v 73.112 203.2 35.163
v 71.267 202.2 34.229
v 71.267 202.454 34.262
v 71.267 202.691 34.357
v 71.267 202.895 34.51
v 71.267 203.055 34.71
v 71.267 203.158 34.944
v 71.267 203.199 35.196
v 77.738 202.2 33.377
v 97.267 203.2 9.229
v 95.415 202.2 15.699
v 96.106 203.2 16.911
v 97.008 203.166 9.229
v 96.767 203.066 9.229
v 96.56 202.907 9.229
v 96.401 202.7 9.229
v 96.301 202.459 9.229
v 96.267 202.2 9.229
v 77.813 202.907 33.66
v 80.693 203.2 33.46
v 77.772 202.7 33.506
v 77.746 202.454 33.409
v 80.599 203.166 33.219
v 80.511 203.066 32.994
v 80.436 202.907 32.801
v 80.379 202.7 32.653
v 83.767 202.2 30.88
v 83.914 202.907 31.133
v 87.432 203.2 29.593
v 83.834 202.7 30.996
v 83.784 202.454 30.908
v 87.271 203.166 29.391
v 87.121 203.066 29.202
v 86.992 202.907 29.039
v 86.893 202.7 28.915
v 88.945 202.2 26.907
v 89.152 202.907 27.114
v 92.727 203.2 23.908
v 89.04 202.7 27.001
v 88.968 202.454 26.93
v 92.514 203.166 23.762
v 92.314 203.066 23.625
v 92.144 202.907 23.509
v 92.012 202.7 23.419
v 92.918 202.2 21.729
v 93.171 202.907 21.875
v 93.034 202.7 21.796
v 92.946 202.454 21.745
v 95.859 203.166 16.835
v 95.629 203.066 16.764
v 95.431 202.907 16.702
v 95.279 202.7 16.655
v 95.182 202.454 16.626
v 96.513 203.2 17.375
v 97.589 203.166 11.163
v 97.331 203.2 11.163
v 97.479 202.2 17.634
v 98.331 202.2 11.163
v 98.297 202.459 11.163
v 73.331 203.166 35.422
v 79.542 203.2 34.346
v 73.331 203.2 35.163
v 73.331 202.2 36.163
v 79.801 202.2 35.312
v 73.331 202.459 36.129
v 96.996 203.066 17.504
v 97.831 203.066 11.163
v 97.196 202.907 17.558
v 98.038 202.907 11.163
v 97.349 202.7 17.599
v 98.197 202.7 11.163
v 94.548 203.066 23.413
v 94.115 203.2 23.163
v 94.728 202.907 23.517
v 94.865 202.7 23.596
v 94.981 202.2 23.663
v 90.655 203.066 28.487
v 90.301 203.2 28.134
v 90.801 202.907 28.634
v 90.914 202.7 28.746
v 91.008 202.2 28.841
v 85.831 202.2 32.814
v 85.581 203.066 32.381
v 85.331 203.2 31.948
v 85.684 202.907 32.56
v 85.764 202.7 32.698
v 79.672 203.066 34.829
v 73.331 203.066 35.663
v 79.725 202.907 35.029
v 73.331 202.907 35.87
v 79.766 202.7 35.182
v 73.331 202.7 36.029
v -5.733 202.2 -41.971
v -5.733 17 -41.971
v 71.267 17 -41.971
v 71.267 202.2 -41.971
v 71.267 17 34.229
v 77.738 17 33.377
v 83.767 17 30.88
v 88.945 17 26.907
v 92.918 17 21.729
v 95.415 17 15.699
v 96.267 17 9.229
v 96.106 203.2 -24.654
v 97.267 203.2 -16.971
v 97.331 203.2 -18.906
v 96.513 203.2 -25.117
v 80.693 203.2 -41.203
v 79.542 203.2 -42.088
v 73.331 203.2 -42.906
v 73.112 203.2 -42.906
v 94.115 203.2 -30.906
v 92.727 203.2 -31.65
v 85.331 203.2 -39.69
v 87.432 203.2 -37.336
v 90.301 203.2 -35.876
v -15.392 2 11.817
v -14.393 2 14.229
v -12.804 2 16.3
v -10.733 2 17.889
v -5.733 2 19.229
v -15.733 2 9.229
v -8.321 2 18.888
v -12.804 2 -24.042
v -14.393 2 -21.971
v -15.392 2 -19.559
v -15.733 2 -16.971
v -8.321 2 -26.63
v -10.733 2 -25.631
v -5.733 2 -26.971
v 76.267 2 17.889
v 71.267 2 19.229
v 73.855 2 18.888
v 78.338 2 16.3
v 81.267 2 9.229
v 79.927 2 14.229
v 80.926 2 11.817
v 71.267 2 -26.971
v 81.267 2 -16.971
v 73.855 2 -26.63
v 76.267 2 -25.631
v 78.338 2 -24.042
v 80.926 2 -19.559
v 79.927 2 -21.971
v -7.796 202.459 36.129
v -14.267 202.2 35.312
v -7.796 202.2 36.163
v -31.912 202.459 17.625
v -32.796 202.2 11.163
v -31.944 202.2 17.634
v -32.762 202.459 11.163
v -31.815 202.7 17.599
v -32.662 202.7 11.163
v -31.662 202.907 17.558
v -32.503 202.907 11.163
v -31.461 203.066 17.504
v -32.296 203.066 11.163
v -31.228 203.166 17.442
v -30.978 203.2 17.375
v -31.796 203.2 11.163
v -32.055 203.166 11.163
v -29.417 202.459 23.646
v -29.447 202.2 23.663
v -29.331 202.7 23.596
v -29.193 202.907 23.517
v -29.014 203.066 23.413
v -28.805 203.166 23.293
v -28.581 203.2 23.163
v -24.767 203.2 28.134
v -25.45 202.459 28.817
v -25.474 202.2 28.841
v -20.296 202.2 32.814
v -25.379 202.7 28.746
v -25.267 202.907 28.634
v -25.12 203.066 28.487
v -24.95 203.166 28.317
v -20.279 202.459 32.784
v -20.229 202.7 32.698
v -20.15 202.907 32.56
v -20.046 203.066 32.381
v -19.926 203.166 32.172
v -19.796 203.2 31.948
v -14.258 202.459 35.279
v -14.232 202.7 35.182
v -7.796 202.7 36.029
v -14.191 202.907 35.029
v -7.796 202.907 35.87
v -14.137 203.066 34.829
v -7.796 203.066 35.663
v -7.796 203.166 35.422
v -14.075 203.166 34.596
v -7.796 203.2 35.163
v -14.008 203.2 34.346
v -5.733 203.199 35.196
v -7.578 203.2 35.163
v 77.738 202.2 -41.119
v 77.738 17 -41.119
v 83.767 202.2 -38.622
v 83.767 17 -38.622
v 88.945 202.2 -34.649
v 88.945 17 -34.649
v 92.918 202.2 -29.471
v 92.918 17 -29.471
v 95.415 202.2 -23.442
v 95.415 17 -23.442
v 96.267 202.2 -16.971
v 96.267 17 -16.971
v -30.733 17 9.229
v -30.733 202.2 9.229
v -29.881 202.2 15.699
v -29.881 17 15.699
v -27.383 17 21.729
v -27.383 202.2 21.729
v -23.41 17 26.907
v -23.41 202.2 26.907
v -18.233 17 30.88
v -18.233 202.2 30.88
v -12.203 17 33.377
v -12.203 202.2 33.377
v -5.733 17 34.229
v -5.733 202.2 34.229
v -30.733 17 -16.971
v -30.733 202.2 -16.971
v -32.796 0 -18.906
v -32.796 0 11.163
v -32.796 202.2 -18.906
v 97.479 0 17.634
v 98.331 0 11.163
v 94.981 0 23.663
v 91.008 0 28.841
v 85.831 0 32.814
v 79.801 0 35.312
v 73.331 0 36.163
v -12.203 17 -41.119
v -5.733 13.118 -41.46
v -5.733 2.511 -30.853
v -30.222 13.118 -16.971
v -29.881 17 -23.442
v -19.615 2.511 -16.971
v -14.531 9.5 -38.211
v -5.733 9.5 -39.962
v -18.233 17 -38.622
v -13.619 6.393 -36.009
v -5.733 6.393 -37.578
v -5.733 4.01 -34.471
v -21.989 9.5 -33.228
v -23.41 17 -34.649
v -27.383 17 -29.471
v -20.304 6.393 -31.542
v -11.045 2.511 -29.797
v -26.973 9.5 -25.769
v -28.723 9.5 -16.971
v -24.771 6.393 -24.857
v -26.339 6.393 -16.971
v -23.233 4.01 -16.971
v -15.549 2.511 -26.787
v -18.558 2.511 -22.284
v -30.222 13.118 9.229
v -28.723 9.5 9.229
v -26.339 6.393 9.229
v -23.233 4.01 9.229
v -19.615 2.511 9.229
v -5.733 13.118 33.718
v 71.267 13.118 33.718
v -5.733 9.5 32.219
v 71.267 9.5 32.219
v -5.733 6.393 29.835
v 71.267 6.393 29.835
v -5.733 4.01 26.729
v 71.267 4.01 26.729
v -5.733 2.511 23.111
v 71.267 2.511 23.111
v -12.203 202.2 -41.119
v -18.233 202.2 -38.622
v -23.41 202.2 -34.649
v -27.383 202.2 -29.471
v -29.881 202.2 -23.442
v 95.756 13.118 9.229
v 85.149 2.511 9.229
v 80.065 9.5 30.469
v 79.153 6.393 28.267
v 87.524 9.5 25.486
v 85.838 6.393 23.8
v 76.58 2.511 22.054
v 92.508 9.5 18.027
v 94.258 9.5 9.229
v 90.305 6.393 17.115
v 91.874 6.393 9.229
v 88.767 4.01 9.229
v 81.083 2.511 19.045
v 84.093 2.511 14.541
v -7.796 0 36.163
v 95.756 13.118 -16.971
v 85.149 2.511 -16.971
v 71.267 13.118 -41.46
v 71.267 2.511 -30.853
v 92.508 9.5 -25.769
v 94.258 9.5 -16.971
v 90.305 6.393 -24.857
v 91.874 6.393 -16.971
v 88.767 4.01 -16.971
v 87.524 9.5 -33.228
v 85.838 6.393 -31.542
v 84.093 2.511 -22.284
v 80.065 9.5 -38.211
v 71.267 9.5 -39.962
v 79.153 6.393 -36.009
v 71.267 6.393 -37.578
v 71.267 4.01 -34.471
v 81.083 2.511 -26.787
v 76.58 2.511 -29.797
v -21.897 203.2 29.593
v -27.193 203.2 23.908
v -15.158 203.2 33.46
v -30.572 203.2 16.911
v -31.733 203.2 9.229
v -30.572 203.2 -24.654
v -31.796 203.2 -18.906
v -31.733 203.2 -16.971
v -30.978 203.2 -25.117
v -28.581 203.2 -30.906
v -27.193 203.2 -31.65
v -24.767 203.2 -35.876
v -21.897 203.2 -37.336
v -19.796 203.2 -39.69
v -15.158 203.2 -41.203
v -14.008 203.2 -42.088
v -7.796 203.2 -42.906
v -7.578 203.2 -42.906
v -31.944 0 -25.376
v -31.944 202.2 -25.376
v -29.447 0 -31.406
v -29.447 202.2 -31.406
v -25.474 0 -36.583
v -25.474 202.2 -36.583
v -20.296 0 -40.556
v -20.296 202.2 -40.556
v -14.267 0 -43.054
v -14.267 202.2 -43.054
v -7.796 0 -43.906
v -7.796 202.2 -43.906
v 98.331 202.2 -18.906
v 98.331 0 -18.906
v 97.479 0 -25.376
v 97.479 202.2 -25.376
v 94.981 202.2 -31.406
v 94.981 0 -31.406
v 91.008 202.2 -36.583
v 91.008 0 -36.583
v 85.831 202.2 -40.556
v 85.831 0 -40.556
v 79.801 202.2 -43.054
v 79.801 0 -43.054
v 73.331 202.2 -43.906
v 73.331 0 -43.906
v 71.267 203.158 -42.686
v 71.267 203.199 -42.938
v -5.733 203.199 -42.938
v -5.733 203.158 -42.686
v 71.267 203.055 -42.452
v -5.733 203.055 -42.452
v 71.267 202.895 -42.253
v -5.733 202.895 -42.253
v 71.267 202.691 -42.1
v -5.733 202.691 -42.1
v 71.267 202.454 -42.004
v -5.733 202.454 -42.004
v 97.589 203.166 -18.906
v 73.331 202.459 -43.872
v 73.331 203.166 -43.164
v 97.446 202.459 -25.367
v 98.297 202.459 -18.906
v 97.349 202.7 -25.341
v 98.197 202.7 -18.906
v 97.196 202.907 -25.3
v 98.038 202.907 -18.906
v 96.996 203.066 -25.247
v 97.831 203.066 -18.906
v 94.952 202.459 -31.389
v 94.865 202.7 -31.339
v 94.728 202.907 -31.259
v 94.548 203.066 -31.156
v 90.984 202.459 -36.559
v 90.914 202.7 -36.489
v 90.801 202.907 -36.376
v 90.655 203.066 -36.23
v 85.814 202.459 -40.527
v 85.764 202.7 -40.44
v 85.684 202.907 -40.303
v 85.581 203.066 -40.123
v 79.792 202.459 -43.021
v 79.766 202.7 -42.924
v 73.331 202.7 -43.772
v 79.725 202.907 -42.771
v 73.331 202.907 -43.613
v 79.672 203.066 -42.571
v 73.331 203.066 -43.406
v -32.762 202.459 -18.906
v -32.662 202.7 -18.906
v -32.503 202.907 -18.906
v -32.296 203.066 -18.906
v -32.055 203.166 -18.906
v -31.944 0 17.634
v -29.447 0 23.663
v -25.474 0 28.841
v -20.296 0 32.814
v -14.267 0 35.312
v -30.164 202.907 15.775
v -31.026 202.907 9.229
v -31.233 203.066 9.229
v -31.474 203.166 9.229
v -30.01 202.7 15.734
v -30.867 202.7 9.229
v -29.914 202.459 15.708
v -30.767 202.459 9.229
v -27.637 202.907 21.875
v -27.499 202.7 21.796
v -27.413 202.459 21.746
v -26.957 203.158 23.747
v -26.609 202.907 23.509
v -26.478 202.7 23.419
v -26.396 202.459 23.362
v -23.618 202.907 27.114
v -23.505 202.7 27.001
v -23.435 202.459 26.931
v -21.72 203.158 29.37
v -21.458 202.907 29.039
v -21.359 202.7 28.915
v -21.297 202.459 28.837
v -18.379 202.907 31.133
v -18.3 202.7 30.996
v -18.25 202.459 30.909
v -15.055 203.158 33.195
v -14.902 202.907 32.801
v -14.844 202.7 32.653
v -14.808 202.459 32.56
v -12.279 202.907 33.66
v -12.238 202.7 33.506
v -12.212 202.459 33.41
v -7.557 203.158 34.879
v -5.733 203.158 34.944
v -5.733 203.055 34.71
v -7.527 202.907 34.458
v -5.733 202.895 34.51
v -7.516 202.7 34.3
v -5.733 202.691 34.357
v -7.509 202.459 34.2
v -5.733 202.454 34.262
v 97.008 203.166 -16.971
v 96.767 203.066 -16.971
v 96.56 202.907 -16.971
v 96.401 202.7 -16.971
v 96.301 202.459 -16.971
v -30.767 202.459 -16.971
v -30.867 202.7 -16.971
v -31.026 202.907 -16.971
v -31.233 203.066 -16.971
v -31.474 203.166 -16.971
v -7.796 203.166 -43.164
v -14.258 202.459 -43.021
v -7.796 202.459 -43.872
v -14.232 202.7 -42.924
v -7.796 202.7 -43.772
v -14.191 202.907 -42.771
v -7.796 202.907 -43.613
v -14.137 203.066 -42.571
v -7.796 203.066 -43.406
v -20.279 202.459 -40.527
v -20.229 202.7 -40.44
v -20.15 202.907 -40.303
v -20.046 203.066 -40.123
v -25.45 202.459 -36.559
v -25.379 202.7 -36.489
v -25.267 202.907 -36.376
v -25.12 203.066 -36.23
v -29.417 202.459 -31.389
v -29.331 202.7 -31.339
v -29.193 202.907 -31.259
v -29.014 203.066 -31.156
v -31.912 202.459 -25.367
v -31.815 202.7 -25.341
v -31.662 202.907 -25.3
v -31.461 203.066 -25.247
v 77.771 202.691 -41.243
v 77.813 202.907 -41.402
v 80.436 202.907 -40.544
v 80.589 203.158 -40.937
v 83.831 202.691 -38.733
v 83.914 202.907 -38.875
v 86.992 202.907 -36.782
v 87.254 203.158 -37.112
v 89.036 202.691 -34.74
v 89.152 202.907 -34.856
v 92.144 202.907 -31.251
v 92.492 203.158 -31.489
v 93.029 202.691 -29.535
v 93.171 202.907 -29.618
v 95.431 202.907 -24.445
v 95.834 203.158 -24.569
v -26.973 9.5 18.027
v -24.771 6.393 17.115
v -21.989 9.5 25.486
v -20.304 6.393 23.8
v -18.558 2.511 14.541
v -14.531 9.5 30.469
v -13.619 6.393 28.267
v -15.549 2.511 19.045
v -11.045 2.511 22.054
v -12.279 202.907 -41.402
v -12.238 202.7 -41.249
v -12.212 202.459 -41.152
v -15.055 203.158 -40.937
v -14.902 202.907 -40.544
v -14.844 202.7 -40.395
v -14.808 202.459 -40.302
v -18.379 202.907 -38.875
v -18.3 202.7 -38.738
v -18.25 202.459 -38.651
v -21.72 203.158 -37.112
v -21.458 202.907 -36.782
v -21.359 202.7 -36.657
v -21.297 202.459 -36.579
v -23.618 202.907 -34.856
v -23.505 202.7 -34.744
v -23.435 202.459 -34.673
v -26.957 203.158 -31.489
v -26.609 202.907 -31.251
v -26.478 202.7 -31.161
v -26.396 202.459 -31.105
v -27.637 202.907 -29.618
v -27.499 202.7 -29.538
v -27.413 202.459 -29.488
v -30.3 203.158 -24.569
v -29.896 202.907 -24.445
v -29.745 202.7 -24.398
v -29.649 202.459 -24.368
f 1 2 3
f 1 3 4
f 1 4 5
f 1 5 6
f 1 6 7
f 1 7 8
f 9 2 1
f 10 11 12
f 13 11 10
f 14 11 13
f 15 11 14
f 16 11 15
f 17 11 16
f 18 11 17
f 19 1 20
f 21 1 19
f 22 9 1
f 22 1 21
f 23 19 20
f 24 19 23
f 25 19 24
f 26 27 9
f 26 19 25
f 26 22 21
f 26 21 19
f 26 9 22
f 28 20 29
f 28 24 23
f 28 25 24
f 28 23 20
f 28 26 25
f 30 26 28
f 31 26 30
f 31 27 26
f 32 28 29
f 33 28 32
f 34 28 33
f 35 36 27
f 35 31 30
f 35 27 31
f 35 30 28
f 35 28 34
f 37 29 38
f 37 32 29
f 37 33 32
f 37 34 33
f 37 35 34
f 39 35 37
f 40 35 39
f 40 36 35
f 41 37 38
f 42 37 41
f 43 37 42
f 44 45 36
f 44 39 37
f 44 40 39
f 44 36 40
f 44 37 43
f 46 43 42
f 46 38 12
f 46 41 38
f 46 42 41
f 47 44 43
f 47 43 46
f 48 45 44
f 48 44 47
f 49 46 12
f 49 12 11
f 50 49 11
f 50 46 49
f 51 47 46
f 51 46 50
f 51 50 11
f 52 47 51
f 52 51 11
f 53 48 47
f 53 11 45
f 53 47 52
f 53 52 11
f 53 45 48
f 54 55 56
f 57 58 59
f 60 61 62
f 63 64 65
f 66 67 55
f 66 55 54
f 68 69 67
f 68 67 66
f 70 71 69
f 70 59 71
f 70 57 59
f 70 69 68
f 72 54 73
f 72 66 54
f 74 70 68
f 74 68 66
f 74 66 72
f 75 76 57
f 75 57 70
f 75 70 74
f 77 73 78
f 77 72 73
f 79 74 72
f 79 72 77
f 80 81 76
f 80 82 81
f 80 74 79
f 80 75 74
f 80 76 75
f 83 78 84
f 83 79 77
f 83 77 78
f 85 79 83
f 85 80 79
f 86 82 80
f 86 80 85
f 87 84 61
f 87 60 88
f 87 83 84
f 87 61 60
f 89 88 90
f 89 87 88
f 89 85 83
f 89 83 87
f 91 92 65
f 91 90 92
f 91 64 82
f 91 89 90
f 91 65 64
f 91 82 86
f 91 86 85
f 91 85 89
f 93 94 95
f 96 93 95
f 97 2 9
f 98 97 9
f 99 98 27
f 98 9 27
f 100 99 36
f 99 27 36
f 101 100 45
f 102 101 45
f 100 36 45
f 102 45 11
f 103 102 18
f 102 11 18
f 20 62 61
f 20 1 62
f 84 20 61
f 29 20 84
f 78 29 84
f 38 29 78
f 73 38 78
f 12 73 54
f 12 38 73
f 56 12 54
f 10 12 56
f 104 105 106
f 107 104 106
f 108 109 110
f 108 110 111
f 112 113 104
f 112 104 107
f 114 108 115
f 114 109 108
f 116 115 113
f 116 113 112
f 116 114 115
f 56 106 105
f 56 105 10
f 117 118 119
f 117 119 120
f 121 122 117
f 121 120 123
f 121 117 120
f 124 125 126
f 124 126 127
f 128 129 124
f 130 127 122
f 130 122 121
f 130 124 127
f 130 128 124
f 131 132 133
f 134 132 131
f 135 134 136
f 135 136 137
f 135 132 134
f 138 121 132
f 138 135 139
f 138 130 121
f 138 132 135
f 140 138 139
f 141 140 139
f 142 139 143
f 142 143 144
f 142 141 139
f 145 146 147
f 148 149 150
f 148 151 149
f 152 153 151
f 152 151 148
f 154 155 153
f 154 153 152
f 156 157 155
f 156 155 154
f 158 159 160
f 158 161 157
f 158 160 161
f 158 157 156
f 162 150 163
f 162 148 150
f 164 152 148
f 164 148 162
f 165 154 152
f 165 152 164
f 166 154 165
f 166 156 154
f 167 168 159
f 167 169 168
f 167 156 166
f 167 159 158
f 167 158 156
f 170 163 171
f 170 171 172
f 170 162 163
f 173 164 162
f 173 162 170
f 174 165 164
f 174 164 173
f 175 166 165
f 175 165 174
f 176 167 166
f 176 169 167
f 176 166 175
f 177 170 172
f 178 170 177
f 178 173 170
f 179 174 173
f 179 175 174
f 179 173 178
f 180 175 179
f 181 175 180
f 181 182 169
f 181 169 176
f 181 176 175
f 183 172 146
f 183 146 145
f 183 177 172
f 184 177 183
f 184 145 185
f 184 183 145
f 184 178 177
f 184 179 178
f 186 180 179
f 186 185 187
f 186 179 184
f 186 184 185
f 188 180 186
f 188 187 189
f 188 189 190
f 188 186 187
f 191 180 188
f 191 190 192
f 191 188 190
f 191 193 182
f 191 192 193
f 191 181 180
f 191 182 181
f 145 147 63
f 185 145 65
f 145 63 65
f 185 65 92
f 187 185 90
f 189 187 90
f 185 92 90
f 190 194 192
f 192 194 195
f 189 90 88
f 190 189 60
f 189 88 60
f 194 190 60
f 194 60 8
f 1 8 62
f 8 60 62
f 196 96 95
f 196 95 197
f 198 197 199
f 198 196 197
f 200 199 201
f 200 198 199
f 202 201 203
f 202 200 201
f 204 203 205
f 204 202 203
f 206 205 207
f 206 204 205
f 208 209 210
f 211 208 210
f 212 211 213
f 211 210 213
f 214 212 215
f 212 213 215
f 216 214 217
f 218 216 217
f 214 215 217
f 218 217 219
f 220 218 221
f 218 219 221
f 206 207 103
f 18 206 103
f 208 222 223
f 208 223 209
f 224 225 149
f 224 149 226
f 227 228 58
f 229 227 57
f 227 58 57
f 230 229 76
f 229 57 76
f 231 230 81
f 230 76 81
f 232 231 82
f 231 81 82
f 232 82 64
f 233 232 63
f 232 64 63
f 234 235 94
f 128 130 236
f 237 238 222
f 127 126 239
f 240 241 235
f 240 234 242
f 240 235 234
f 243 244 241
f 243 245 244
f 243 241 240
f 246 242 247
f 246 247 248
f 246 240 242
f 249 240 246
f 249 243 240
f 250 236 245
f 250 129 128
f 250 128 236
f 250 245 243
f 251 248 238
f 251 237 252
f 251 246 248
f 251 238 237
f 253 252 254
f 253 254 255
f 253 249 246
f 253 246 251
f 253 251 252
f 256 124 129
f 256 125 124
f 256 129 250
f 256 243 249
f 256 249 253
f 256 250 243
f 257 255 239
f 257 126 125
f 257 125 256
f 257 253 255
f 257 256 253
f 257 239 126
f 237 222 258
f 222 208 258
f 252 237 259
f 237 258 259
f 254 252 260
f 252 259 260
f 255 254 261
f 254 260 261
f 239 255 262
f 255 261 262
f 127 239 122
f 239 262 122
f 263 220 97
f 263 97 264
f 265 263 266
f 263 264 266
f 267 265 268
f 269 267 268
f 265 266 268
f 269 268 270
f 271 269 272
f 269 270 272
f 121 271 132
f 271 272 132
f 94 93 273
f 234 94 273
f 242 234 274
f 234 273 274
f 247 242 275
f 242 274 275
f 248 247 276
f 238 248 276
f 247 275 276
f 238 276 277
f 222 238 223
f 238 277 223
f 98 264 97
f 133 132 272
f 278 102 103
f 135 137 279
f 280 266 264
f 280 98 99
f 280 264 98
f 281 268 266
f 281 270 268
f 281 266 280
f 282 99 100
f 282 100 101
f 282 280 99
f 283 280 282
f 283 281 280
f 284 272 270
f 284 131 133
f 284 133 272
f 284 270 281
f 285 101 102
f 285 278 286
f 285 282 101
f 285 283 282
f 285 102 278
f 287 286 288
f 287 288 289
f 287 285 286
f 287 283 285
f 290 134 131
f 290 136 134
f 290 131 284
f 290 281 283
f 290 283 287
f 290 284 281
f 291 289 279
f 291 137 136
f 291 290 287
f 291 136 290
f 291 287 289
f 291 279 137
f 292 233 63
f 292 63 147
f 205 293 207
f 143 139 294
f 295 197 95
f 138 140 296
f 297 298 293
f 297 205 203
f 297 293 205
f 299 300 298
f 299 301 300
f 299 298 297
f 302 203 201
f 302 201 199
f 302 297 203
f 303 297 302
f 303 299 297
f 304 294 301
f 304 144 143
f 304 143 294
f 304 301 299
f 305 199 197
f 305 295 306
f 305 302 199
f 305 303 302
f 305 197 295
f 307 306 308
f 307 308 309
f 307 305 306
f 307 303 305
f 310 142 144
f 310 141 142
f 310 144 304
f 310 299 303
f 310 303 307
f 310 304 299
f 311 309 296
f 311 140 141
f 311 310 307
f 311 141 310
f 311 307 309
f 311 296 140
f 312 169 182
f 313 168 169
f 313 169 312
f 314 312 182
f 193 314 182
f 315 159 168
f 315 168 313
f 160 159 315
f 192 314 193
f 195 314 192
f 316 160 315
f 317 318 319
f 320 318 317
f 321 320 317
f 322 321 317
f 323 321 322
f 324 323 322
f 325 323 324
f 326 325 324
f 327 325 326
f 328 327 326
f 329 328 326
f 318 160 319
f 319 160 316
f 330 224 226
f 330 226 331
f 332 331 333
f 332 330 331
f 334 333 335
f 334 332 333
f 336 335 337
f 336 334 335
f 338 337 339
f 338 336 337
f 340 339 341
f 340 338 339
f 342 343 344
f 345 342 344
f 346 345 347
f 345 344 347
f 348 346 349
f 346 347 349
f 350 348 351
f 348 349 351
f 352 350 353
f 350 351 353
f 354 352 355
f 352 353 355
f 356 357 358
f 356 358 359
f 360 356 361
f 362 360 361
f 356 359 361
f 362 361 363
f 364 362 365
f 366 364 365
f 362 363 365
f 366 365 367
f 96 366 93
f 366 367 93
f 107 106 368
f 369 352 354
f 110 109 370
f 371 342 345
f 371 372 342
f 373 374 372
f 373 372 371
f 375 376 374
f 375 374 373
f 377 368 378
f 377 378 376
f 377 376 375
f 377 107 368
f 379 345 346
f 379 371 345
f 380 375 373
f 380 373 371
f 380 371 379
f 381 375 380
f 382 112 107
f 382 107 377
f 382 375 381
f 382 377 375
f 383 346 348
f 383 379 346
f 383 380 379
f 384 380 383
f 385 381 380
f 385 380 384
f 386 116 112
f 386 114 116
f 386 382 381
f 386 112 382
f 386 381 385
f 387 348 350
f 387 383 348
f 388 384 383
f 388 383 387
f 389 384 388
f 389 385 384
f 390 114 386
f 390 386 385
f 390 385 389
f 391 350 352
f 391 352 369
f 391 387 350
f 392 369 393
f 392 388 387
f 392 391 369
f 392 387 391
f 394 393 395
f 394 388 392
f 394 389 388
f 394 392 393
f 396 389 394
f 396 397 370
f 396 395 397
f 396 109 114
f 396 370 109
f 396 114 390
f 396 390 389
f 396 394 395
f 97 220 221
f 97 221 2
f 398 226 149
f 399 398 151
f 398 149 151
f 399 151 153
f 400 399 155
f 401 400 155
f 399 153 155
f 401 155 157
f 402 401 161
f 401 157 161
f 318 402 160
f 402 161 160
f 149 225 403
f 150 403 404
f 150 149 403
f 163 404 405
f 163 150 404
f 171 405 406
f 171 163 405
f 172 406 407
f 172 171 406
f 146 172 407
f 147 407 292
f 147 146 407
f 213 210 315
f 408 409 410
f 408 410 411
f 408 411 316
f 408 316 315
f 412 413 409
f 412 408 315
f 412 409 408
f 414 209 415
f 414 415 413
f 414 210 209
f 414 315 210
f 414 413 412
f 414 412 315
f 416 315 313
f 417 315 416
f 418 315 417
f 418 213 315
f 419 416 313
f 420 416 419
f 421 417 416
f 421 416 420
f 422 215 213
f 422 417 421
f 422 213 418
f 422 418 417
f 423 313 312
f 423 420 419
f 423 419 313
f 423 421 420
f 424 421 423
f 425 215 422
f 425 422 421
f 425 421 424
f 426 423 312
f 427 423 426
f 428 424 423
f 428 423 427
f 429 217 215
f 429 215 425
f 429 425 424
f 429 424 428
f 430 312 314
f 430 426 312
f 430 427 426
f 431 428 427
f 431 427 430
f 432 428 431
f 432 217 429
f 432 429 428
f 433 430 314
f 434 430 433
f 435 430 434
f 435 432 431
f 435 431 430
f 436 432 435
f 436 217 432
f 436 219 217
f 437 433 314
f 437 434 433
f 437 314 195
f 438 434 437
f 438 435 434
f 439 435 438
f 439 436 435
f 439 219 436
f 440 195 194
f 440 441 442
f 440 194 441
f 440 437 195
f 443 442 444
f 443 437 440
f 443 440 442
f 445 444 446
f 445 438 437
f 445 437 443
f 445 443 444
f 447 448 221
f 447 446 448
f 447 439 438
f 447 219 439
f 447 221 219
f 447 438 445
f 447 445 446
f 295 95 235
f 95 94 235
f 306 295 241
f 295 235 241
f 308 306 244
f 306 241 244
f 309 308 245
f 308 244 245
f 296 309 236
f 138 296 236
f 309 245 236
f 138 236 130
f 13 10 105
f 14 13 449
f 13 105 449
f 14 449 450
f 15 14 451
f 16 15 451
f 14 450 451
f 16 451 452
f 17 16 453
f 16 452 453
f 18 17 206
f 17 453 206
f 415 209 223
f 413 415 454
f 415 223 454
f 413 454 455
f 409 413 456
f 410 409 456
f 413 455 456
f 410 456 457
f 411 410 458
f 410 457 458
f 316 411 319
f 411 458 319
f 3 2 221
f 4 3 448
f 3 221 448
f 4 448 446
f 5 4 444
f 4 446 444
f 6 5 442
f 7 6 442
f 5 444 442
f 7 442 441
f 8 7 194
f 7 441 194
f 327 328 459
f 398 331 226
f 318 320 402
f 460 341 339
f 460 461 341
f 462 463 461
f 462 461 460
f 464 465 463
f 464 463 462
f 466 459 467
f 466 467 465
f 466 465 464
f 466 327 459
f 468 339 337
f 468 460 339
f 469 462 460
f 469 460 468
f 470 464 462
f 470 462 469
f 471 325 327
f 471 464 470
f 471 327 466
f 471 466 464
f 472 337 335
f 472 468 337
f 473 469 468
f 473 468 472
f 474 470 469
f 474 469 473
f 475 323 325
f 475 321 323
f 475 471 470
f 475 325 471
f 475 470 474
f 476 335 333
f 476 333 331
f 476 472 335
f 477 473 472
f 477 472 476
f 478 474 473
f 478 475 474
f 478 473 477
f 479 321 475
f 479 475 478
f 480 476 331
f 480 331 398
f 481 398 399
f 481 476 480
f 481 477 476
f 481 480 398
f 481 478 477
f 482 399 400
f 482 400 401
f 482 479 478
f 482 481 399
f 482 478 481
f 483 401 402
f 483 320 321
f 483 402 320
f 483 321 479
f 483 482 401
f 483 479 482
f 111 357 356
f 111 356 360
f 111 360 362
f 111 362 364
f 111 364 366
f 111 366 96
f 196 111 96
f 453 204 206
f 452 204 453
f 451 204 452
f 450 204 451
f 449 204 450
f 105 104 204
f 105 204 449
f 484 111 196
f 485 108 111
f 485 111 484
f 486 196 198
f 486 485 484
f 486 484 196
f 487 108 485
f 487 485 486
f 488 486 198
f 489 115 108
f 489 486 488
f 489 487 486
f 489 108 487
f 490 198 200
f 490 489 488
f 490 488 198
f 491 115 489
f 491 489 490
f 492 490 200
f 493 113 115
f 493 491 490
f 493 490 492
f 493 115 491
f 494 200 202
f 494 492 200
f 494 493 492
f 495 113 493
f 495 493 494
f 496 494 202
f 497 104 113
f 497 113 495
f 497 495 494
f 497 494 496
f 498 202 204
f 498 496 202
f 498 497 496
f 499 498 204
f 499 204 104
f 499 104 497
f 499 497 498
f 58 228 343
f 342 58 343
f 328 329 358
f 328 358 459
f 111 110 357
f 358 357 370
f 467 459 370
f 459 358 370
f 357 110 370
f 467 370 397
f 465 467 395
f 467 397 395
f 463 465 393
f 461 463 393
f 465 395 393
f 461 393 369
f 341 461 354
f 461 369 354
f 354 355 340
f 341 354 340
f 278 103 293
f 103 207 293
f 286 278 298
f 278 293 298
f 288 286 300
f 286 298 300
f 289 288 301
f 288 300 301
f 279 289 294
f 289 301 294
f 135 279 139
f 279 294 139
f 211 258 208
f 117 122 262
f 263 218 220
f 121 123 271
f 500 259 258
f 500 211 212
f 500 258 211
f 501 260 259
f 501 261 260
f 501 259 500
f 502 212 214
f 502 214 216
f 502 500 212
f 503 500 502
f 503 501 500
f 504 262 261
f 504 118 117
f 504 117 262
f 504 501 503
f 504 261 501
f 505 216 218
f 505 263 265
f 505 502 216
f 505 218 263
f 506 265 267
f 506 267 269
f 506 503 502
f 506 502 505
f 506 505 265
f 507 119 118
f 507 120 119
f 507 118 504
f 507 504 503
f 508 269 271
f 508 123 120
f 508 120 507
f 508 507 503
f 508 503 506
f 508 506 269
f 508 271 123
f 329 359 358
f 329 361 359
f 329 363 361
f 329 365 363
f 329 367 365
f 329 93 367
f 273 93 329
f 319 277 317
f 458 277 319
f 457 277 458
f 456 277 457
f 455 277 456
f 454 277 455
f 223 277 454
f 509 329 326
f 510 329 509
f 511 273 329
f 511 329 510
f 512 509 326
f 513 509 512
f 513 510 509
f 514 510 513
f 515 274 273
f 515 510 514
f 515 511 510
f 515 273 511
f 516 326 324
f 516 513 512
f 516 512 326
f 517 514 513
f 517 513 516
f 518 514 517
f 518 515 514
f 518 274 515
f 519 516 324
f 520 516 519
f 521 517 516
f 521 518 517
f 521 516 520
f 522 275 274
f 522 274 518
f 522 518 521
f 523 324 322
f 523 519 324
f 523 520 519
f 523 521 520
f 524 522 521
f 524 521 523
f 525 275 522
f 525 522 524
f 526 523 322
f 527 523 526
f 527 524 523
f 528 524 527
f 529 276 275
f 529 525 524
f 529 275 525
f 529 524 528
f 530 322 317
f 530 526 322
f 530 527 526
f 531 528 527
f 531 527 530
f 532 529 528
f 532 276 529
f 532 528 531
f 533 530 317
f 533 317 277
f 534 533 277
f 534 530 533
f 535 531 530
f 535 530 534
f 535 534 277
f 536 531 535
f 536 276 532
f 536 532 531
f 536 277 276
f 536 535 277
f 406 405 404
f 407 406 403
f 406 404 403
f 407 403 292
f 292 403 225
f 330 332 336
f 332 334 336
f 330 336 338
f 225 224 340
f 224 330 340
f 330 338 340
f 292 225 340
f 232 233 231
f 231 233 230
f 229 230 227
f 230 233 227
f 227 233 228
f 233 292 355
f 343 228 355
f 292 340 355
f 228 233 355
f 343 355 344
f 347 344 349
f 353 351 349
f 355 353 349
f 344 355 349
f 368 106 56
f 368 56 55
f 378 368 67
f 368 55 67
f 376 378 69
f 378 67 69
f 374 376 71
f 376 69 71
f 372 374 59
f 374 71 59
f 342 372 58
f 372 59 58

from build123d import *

# Parameters (mm, degrees)
SKETCH1_W           = 127
SKETCH1_H           = 76.2
BOSS_EXTRUDE1_DEPTH = 2
BOSS_EXTRUDE2_DEPTH = 203.2
FILLET2_R           = 25
FILLET3_R           = 15
FILLET4_R           = 1


with BuildPart() as part:
    # Sketch1 → Boss-Extrude1 (new body)
    with BuildSketch(Plane(origin=(0, 0, 0), x_dir=(1, 0, 0), z_dir=(0, 1, 0))):
        with Locations((32.767173068, 3.871122995)):
            Rectangle(SKETCH1_W, SKETCH1_H)
        Polygon((96.267173068, -34.228877005), (98.330615884, -36.163354646), (-32.796269749, -36.163354646), (-32.796269749, 43.905600635), (-30.732826932, 41.971122995), (-30.732826932, -34.228877005), align=None)
        Polygon((96.267173068, 41.971122995), (96.267173068, -34.228877005), (98.330615884, -36.163354646), (98.330615884, 43.905600635), align=None)
        Polygon((-30.732826932, 41.971122995), (96.267173068, 41.971122995), (98.330615884, 43.905600635), (-32.796269749, 43.905600635), align=None)
    extrude(amount=BOSS_EXTRUDE1_DEPTH)

    # Sketch1<3> → Boss-Extrude2 (add)
    with BuildSketch(Plane(origin=(0, 0, 0), x_dir=(1, 0, 0), z_dir=(0, 1, 0))):
        Polygon((96.267173068, 41.971122995), (96.267173068, -34.228877005), (98.330615884, -36.163354646), (98.330615884, 43.905600635), align=None)
        Polygon((-30.732826932, 41.971122995), (96.267173068, 41.971122995), (98.330615884, 43.905600635), (-32.796269749, 43.905600635), align=None)
        Polygon((96.267173068, -34.228877005), (98.330615884, -36.163354646), (-32.796269749, -36.163354646), (-32.796269749, 43.905600635), (-30.732826932, 41.971122995), (-30.732826932, -34.228877005), align=None)
    extrude(amount=BOSS_EXTRUDE2_DEPTH)

    # Fillet2
    fillet2_edges = [part.edges().sort_by_distance(p)[0] for p in [
        (96.267173068, 102.6, -41.971122995),
        (96.267173068, 102.6, 34.228877005),
        (-30.732826932, 102.6, 34.228877005),
        (-30.732826932, 102.6, -41.971122995),
        (98.330615884, 101.6, 36.163354646),
        (-32.796269749, 101.6, 36.163354646),
        (-32.796269749, 101.6, -43.905600635),
        (98.330615884, 101.6, -43.905600635),
    ]]
    fillet(fillet2_edges, radius=FILLET2_R)

    # Fillet3
    fillet3_edges = [part.edges().sort_by_distance(p)[0] for p in [
        (32.767173068, 2, -41.971122995),
        (32.767173068, 2, 34.228877005),
        (96.267173068, 2, -3.871122995),
        (-30.732826932, 2, -3.871122995),
        (88.944842597, 2, -34.648792524),
        (88.944842597, 2, 26.906546535),
        (-23.410496462, 2, 26.906546535),
        (-23.410496462, 2, -34.648792524),
    ]]
    fillet(fillet3_edges, radius=FILLET3_R)

    # Fillet4
    # the kernel refuses this fillet: 1 mm, written as the material it takes off along each edge
    with BuildSketch(Plane(origin=(-32.796269749, 203.2, 11.163354646), x_dir=(1, 0, 0), z_dir=(0, 0, -1))) as fillet4_piece_1:
        with BuildLine():
            CenterArc((FILLET4_R, FILLET4_R), FILLET4_R, 180, 90)
            Line((0, FILLET4_R), (0, 0))
            Line((0, 0), (FILLET4_R, 0))
        make_face()
    extrude(amount=30.068955281, mode=Mode.SUBTRACT)
    with BuildSketch(Plane(origin=(73.330615884, 203.2, -43.905600635), x_dir=(0, 0, 1), z_dir=(-1, 0, 0))) as fillet4_piece_2:
        with BuildLine():
            CenterArc((FILLET4_R, -FILLET4_R), FILLET4_R, 90, 90)
            Line((0, -FILLET4_R), (0, 0))
            Line((0, 0), (FILLET4_R, 0))
        make_face()
    extrude(amount=81.126885633, mode=Mode.SUBTRACT)
    with BuildSketch(Plane(origin=(73.330615884, 203.2, 36.163354646), x_dir=(0, 0, -1), z_dir=(-1, 0, 0))) as fillet4_piece_3:
        with BuildLine():
            CenterArc((FILLET4_R, FILLET4_R), FILLET4_R, 180, 90)
            Line((0, FILLET4_R), (0, 0))
            Line((0, 0), (FILLET4_R, 0))
        make_face()
    extrude(amount=81.126885633, mode=Mode.SUBTRACT)
    with BuildSketch(Plane(origin=(98.330615884, 203.2, 11.163354646), x_dir=(-1, 0, 0), z_dir=(0, 0, -1))) as fillet4_piece_4:
        with BuildLine():
            CenterArc((FILLET4_R, -FILLET4_R), FILLET4_R, 90, 90)
            Line((0, -FILLET4_R), (0, 0))
            Line((0, 0), (FILLET4_R, 0))
        make_face()
    extrude(amount=30.068955281, mode=Mode.SUBTRACT)
    with BuildSketch(Plane(origin=(-5.732826932, 203.2, -41.971122995), x_dir=(0, 0, -1), z_dir=(1, 0, 0))) as fillet4_piece_5:
        with BuildLine():
            CenterArc((FILLET4_R, -FILLET4_R), FILLET4_R, 90, 90)
            Line((0, -FILLET4_R), (0, 0))
            Line((0, 0), (FILLET4_R, 0))
        make_face()
    extrude(amount=77, mode=Mode.SUBTRACT)
    with BuildSketch(Plane(origin=(-30.732826932, 203.2, -16.971122995), x_dir=(-1, 0, 0), z_dir=(0, 0, 1)), Plane(origin=(96.267173068, 203.2, -16.971122995), x_dir=(0, -1, 0), z_dir=(0, 0, 1))) as fillet4_piece_6:
        with BuildLine():
            CenterArc((FILLET4_R, FILLET4_R), FILLET4_R, 180, 90)
            Line((0, FILLET4_R), (0, 0))
            Line((0, 0), (FILLET4_R, 0))
        make_face()
    extrude(amount=26.2, mode=Mode.SUBTRACT)
    with BuildSketch(Plane(origin=(-5.732826932, 203.2, 34.228877005), x_dir=(0, 0, 1), z_dir=(1, 0, 0))) as fillet4_piece_7:
        with BuildLine():
            CenterArc((FILLET4_R, FILLET4_R), FILLET4_R, 180, 90)
            Line((0, FILLET4_R), (0, 0))
            Line((0, 0), (FILLET4_R, 0))
        make_face()
    extrude(amount=77, mode=Mode.SUBTRACT)
    with BuildSketch(Plane(origin=(-5.732826932, 203.2, -16.971122995), x_dir=(0, 0, -1), z_dir=(1, 0, 0))) as fillet4_piece_8:
        with BuildLine():
            CenterArc((25 + FILLET4_R, -FILLET4_R), FILLET4_R, 90, 90)
            Line((25, -FILLET4_R), (25, 0))
            Line((25, 0), (25 + FILLET4_R, 0))
        make_face()
    revolve(axis=Axis((-5.732826932, 203.2, -16.971122995), (0, 1, 0)), revolution_arc=90, mode=Mode.SUBTRACT)
    with BuildSketch(Plane(origin=(-5.732826932, 203.2, 9.228877005), x_dir=(-1, 0, 0), z_dir=(0, 0, -1))) as fillet4_piece_9:
        with BuildLine():
            CenterArc((25 + FILLET4_R, -FILLET4_R), FILLET4_R, 90, 90)
            Line((25, -FILLET4_R), (25, 0))
            Line((25, 0), (25 + FILLET4_R, 0))
        make_face()
    revolve(axis=Axis((-5.732826932, 203.2, 9.228877005), (0, 1, 0)), revolution_arc=90, mode=Mode.SUBTRACT)
    with BuildSketch(Plane(origin=(71.267173068, 203.2, 9.228877005), x_dir=(0, 0, 1), z_dir=(-1, 0, 0))) as fillet4_piece_10:
        with BuildLine():
            CenterArc((25 + FILLET4_R, -FILLET4_R), FILLET4_R, 90, 90)
            Line((25, -FILLET4_R), (25, 0))
            Line((25, 0), (25 + FILLET4_R, 0))
        make_face()
    revolve(axis=Axis((71.267173068, 203.2, 9.228877005), (0, 1, 0)), revolution_arc=90, mode=Mode.SUBTRACT)
    with BuildSketch(Plane(origin=(71.267173068, 203.2, -16.971122995), x_dir=(0, 0, -1), z_dir=(-1, 0, 0))) as fillet4_piece_11:
        with BuildLine():
            CenterArc((25 + FILLET4_R, FILLET4_R), FILLET4_R, 180, 90)
            Line((25 + FILLET4_R, 0), (25, 0))
            Line((25, 0), (25, FILLET4_R))
        make_face()
    revolve(axis=Axis((71.267173068, 203.2, -16.971122995), (0, -1, 0)), revolution_arc=90, mode=Mode.SUBTRACT)
    with BuildSketch(Plane(origin=(73.330615884, 203.2, -18.905600635), x_dir=(1, 0, 0), z_dir=(0, 0, 1))) as fillet4_piece_12:
        with BuildLine():
            CenterArc((25 - FILLET4_R, -FILLET4_R), FILLET4_R, 0, 90)
            Line((25, -FILLET4_R), (25, 0))
            Line((25, 0), (25 - FILLET4_R, 0))
        make_face()
    revolve(axis=Axis((73.330615884, 203.2, -18.905600635), (0, 1, 0)), revolution_arc=90, mode=Mode.SUBTRACT)
    with BuildSketch(Plane(origin=(73.330615884, 203.2, 11.163354646), x_dir=(1, 0, 0), z_dir=(0, 0, -1))) as fillet4_piece_13:
        with BuildLine():
            CenterArc((25 - FILLET4_R, FILLET4_R), FILLET4_R, 270, 90)
            Line((25, FILLET4_R), (25, 0))
            Line((25, 0), (25 - FILLET4_R, 0))
        make_face()
    revolve(axis=Axis((73.330615884, 203.2, 11.163354646), (0, -1, 0)), revolution_arc=90, mode=Mode.SUBTRACT)
    with BuildSketch(Plane(origin=(-7.796269749, 203.2, 11.163354646), x_dir=(-1, 0, 0), z_dir=(0, 0, -1))) as fillet4_piece_14:
        with BuildLine():
            CenterArc((25 - FILLET4_R, -FILLET4_R), FILLET4_R, 0, 90)
            Line((25, -FILLET4_R), (25, 0))
            Line((25, 0), (25 - FILLET4_R, 0))
        make_face()
    revolve(axis=Axis((-7.796269749, 203.2, 11.163354646), (0, 1, 0)), revolution_arc=90, mode=Mode.SUBTRACT)
    with BuildSketch(Plane(origin=(-7.796269749, 203.2, -18.905600635), x_dir=(0, 0, -1), z_dir=(1, 0, 0))) as fillet4_piece_15:
        with BuildLine():
            CenterArc((25 - FILLET4_R, -FILLET4_R), FILLET4_R, 0, 90)
            Line((25, -FILLET4_R), (25, 0))
            Line((25, 0), (25 - FILLET4_R, 0))
        make_face()
    revolve(axis=Axis((-7.796269749, 203.2, -18.905600635), (0, 1, 0)), revolution_arc=90, mode=Mode.SUBTRACT)


solid = part.part
